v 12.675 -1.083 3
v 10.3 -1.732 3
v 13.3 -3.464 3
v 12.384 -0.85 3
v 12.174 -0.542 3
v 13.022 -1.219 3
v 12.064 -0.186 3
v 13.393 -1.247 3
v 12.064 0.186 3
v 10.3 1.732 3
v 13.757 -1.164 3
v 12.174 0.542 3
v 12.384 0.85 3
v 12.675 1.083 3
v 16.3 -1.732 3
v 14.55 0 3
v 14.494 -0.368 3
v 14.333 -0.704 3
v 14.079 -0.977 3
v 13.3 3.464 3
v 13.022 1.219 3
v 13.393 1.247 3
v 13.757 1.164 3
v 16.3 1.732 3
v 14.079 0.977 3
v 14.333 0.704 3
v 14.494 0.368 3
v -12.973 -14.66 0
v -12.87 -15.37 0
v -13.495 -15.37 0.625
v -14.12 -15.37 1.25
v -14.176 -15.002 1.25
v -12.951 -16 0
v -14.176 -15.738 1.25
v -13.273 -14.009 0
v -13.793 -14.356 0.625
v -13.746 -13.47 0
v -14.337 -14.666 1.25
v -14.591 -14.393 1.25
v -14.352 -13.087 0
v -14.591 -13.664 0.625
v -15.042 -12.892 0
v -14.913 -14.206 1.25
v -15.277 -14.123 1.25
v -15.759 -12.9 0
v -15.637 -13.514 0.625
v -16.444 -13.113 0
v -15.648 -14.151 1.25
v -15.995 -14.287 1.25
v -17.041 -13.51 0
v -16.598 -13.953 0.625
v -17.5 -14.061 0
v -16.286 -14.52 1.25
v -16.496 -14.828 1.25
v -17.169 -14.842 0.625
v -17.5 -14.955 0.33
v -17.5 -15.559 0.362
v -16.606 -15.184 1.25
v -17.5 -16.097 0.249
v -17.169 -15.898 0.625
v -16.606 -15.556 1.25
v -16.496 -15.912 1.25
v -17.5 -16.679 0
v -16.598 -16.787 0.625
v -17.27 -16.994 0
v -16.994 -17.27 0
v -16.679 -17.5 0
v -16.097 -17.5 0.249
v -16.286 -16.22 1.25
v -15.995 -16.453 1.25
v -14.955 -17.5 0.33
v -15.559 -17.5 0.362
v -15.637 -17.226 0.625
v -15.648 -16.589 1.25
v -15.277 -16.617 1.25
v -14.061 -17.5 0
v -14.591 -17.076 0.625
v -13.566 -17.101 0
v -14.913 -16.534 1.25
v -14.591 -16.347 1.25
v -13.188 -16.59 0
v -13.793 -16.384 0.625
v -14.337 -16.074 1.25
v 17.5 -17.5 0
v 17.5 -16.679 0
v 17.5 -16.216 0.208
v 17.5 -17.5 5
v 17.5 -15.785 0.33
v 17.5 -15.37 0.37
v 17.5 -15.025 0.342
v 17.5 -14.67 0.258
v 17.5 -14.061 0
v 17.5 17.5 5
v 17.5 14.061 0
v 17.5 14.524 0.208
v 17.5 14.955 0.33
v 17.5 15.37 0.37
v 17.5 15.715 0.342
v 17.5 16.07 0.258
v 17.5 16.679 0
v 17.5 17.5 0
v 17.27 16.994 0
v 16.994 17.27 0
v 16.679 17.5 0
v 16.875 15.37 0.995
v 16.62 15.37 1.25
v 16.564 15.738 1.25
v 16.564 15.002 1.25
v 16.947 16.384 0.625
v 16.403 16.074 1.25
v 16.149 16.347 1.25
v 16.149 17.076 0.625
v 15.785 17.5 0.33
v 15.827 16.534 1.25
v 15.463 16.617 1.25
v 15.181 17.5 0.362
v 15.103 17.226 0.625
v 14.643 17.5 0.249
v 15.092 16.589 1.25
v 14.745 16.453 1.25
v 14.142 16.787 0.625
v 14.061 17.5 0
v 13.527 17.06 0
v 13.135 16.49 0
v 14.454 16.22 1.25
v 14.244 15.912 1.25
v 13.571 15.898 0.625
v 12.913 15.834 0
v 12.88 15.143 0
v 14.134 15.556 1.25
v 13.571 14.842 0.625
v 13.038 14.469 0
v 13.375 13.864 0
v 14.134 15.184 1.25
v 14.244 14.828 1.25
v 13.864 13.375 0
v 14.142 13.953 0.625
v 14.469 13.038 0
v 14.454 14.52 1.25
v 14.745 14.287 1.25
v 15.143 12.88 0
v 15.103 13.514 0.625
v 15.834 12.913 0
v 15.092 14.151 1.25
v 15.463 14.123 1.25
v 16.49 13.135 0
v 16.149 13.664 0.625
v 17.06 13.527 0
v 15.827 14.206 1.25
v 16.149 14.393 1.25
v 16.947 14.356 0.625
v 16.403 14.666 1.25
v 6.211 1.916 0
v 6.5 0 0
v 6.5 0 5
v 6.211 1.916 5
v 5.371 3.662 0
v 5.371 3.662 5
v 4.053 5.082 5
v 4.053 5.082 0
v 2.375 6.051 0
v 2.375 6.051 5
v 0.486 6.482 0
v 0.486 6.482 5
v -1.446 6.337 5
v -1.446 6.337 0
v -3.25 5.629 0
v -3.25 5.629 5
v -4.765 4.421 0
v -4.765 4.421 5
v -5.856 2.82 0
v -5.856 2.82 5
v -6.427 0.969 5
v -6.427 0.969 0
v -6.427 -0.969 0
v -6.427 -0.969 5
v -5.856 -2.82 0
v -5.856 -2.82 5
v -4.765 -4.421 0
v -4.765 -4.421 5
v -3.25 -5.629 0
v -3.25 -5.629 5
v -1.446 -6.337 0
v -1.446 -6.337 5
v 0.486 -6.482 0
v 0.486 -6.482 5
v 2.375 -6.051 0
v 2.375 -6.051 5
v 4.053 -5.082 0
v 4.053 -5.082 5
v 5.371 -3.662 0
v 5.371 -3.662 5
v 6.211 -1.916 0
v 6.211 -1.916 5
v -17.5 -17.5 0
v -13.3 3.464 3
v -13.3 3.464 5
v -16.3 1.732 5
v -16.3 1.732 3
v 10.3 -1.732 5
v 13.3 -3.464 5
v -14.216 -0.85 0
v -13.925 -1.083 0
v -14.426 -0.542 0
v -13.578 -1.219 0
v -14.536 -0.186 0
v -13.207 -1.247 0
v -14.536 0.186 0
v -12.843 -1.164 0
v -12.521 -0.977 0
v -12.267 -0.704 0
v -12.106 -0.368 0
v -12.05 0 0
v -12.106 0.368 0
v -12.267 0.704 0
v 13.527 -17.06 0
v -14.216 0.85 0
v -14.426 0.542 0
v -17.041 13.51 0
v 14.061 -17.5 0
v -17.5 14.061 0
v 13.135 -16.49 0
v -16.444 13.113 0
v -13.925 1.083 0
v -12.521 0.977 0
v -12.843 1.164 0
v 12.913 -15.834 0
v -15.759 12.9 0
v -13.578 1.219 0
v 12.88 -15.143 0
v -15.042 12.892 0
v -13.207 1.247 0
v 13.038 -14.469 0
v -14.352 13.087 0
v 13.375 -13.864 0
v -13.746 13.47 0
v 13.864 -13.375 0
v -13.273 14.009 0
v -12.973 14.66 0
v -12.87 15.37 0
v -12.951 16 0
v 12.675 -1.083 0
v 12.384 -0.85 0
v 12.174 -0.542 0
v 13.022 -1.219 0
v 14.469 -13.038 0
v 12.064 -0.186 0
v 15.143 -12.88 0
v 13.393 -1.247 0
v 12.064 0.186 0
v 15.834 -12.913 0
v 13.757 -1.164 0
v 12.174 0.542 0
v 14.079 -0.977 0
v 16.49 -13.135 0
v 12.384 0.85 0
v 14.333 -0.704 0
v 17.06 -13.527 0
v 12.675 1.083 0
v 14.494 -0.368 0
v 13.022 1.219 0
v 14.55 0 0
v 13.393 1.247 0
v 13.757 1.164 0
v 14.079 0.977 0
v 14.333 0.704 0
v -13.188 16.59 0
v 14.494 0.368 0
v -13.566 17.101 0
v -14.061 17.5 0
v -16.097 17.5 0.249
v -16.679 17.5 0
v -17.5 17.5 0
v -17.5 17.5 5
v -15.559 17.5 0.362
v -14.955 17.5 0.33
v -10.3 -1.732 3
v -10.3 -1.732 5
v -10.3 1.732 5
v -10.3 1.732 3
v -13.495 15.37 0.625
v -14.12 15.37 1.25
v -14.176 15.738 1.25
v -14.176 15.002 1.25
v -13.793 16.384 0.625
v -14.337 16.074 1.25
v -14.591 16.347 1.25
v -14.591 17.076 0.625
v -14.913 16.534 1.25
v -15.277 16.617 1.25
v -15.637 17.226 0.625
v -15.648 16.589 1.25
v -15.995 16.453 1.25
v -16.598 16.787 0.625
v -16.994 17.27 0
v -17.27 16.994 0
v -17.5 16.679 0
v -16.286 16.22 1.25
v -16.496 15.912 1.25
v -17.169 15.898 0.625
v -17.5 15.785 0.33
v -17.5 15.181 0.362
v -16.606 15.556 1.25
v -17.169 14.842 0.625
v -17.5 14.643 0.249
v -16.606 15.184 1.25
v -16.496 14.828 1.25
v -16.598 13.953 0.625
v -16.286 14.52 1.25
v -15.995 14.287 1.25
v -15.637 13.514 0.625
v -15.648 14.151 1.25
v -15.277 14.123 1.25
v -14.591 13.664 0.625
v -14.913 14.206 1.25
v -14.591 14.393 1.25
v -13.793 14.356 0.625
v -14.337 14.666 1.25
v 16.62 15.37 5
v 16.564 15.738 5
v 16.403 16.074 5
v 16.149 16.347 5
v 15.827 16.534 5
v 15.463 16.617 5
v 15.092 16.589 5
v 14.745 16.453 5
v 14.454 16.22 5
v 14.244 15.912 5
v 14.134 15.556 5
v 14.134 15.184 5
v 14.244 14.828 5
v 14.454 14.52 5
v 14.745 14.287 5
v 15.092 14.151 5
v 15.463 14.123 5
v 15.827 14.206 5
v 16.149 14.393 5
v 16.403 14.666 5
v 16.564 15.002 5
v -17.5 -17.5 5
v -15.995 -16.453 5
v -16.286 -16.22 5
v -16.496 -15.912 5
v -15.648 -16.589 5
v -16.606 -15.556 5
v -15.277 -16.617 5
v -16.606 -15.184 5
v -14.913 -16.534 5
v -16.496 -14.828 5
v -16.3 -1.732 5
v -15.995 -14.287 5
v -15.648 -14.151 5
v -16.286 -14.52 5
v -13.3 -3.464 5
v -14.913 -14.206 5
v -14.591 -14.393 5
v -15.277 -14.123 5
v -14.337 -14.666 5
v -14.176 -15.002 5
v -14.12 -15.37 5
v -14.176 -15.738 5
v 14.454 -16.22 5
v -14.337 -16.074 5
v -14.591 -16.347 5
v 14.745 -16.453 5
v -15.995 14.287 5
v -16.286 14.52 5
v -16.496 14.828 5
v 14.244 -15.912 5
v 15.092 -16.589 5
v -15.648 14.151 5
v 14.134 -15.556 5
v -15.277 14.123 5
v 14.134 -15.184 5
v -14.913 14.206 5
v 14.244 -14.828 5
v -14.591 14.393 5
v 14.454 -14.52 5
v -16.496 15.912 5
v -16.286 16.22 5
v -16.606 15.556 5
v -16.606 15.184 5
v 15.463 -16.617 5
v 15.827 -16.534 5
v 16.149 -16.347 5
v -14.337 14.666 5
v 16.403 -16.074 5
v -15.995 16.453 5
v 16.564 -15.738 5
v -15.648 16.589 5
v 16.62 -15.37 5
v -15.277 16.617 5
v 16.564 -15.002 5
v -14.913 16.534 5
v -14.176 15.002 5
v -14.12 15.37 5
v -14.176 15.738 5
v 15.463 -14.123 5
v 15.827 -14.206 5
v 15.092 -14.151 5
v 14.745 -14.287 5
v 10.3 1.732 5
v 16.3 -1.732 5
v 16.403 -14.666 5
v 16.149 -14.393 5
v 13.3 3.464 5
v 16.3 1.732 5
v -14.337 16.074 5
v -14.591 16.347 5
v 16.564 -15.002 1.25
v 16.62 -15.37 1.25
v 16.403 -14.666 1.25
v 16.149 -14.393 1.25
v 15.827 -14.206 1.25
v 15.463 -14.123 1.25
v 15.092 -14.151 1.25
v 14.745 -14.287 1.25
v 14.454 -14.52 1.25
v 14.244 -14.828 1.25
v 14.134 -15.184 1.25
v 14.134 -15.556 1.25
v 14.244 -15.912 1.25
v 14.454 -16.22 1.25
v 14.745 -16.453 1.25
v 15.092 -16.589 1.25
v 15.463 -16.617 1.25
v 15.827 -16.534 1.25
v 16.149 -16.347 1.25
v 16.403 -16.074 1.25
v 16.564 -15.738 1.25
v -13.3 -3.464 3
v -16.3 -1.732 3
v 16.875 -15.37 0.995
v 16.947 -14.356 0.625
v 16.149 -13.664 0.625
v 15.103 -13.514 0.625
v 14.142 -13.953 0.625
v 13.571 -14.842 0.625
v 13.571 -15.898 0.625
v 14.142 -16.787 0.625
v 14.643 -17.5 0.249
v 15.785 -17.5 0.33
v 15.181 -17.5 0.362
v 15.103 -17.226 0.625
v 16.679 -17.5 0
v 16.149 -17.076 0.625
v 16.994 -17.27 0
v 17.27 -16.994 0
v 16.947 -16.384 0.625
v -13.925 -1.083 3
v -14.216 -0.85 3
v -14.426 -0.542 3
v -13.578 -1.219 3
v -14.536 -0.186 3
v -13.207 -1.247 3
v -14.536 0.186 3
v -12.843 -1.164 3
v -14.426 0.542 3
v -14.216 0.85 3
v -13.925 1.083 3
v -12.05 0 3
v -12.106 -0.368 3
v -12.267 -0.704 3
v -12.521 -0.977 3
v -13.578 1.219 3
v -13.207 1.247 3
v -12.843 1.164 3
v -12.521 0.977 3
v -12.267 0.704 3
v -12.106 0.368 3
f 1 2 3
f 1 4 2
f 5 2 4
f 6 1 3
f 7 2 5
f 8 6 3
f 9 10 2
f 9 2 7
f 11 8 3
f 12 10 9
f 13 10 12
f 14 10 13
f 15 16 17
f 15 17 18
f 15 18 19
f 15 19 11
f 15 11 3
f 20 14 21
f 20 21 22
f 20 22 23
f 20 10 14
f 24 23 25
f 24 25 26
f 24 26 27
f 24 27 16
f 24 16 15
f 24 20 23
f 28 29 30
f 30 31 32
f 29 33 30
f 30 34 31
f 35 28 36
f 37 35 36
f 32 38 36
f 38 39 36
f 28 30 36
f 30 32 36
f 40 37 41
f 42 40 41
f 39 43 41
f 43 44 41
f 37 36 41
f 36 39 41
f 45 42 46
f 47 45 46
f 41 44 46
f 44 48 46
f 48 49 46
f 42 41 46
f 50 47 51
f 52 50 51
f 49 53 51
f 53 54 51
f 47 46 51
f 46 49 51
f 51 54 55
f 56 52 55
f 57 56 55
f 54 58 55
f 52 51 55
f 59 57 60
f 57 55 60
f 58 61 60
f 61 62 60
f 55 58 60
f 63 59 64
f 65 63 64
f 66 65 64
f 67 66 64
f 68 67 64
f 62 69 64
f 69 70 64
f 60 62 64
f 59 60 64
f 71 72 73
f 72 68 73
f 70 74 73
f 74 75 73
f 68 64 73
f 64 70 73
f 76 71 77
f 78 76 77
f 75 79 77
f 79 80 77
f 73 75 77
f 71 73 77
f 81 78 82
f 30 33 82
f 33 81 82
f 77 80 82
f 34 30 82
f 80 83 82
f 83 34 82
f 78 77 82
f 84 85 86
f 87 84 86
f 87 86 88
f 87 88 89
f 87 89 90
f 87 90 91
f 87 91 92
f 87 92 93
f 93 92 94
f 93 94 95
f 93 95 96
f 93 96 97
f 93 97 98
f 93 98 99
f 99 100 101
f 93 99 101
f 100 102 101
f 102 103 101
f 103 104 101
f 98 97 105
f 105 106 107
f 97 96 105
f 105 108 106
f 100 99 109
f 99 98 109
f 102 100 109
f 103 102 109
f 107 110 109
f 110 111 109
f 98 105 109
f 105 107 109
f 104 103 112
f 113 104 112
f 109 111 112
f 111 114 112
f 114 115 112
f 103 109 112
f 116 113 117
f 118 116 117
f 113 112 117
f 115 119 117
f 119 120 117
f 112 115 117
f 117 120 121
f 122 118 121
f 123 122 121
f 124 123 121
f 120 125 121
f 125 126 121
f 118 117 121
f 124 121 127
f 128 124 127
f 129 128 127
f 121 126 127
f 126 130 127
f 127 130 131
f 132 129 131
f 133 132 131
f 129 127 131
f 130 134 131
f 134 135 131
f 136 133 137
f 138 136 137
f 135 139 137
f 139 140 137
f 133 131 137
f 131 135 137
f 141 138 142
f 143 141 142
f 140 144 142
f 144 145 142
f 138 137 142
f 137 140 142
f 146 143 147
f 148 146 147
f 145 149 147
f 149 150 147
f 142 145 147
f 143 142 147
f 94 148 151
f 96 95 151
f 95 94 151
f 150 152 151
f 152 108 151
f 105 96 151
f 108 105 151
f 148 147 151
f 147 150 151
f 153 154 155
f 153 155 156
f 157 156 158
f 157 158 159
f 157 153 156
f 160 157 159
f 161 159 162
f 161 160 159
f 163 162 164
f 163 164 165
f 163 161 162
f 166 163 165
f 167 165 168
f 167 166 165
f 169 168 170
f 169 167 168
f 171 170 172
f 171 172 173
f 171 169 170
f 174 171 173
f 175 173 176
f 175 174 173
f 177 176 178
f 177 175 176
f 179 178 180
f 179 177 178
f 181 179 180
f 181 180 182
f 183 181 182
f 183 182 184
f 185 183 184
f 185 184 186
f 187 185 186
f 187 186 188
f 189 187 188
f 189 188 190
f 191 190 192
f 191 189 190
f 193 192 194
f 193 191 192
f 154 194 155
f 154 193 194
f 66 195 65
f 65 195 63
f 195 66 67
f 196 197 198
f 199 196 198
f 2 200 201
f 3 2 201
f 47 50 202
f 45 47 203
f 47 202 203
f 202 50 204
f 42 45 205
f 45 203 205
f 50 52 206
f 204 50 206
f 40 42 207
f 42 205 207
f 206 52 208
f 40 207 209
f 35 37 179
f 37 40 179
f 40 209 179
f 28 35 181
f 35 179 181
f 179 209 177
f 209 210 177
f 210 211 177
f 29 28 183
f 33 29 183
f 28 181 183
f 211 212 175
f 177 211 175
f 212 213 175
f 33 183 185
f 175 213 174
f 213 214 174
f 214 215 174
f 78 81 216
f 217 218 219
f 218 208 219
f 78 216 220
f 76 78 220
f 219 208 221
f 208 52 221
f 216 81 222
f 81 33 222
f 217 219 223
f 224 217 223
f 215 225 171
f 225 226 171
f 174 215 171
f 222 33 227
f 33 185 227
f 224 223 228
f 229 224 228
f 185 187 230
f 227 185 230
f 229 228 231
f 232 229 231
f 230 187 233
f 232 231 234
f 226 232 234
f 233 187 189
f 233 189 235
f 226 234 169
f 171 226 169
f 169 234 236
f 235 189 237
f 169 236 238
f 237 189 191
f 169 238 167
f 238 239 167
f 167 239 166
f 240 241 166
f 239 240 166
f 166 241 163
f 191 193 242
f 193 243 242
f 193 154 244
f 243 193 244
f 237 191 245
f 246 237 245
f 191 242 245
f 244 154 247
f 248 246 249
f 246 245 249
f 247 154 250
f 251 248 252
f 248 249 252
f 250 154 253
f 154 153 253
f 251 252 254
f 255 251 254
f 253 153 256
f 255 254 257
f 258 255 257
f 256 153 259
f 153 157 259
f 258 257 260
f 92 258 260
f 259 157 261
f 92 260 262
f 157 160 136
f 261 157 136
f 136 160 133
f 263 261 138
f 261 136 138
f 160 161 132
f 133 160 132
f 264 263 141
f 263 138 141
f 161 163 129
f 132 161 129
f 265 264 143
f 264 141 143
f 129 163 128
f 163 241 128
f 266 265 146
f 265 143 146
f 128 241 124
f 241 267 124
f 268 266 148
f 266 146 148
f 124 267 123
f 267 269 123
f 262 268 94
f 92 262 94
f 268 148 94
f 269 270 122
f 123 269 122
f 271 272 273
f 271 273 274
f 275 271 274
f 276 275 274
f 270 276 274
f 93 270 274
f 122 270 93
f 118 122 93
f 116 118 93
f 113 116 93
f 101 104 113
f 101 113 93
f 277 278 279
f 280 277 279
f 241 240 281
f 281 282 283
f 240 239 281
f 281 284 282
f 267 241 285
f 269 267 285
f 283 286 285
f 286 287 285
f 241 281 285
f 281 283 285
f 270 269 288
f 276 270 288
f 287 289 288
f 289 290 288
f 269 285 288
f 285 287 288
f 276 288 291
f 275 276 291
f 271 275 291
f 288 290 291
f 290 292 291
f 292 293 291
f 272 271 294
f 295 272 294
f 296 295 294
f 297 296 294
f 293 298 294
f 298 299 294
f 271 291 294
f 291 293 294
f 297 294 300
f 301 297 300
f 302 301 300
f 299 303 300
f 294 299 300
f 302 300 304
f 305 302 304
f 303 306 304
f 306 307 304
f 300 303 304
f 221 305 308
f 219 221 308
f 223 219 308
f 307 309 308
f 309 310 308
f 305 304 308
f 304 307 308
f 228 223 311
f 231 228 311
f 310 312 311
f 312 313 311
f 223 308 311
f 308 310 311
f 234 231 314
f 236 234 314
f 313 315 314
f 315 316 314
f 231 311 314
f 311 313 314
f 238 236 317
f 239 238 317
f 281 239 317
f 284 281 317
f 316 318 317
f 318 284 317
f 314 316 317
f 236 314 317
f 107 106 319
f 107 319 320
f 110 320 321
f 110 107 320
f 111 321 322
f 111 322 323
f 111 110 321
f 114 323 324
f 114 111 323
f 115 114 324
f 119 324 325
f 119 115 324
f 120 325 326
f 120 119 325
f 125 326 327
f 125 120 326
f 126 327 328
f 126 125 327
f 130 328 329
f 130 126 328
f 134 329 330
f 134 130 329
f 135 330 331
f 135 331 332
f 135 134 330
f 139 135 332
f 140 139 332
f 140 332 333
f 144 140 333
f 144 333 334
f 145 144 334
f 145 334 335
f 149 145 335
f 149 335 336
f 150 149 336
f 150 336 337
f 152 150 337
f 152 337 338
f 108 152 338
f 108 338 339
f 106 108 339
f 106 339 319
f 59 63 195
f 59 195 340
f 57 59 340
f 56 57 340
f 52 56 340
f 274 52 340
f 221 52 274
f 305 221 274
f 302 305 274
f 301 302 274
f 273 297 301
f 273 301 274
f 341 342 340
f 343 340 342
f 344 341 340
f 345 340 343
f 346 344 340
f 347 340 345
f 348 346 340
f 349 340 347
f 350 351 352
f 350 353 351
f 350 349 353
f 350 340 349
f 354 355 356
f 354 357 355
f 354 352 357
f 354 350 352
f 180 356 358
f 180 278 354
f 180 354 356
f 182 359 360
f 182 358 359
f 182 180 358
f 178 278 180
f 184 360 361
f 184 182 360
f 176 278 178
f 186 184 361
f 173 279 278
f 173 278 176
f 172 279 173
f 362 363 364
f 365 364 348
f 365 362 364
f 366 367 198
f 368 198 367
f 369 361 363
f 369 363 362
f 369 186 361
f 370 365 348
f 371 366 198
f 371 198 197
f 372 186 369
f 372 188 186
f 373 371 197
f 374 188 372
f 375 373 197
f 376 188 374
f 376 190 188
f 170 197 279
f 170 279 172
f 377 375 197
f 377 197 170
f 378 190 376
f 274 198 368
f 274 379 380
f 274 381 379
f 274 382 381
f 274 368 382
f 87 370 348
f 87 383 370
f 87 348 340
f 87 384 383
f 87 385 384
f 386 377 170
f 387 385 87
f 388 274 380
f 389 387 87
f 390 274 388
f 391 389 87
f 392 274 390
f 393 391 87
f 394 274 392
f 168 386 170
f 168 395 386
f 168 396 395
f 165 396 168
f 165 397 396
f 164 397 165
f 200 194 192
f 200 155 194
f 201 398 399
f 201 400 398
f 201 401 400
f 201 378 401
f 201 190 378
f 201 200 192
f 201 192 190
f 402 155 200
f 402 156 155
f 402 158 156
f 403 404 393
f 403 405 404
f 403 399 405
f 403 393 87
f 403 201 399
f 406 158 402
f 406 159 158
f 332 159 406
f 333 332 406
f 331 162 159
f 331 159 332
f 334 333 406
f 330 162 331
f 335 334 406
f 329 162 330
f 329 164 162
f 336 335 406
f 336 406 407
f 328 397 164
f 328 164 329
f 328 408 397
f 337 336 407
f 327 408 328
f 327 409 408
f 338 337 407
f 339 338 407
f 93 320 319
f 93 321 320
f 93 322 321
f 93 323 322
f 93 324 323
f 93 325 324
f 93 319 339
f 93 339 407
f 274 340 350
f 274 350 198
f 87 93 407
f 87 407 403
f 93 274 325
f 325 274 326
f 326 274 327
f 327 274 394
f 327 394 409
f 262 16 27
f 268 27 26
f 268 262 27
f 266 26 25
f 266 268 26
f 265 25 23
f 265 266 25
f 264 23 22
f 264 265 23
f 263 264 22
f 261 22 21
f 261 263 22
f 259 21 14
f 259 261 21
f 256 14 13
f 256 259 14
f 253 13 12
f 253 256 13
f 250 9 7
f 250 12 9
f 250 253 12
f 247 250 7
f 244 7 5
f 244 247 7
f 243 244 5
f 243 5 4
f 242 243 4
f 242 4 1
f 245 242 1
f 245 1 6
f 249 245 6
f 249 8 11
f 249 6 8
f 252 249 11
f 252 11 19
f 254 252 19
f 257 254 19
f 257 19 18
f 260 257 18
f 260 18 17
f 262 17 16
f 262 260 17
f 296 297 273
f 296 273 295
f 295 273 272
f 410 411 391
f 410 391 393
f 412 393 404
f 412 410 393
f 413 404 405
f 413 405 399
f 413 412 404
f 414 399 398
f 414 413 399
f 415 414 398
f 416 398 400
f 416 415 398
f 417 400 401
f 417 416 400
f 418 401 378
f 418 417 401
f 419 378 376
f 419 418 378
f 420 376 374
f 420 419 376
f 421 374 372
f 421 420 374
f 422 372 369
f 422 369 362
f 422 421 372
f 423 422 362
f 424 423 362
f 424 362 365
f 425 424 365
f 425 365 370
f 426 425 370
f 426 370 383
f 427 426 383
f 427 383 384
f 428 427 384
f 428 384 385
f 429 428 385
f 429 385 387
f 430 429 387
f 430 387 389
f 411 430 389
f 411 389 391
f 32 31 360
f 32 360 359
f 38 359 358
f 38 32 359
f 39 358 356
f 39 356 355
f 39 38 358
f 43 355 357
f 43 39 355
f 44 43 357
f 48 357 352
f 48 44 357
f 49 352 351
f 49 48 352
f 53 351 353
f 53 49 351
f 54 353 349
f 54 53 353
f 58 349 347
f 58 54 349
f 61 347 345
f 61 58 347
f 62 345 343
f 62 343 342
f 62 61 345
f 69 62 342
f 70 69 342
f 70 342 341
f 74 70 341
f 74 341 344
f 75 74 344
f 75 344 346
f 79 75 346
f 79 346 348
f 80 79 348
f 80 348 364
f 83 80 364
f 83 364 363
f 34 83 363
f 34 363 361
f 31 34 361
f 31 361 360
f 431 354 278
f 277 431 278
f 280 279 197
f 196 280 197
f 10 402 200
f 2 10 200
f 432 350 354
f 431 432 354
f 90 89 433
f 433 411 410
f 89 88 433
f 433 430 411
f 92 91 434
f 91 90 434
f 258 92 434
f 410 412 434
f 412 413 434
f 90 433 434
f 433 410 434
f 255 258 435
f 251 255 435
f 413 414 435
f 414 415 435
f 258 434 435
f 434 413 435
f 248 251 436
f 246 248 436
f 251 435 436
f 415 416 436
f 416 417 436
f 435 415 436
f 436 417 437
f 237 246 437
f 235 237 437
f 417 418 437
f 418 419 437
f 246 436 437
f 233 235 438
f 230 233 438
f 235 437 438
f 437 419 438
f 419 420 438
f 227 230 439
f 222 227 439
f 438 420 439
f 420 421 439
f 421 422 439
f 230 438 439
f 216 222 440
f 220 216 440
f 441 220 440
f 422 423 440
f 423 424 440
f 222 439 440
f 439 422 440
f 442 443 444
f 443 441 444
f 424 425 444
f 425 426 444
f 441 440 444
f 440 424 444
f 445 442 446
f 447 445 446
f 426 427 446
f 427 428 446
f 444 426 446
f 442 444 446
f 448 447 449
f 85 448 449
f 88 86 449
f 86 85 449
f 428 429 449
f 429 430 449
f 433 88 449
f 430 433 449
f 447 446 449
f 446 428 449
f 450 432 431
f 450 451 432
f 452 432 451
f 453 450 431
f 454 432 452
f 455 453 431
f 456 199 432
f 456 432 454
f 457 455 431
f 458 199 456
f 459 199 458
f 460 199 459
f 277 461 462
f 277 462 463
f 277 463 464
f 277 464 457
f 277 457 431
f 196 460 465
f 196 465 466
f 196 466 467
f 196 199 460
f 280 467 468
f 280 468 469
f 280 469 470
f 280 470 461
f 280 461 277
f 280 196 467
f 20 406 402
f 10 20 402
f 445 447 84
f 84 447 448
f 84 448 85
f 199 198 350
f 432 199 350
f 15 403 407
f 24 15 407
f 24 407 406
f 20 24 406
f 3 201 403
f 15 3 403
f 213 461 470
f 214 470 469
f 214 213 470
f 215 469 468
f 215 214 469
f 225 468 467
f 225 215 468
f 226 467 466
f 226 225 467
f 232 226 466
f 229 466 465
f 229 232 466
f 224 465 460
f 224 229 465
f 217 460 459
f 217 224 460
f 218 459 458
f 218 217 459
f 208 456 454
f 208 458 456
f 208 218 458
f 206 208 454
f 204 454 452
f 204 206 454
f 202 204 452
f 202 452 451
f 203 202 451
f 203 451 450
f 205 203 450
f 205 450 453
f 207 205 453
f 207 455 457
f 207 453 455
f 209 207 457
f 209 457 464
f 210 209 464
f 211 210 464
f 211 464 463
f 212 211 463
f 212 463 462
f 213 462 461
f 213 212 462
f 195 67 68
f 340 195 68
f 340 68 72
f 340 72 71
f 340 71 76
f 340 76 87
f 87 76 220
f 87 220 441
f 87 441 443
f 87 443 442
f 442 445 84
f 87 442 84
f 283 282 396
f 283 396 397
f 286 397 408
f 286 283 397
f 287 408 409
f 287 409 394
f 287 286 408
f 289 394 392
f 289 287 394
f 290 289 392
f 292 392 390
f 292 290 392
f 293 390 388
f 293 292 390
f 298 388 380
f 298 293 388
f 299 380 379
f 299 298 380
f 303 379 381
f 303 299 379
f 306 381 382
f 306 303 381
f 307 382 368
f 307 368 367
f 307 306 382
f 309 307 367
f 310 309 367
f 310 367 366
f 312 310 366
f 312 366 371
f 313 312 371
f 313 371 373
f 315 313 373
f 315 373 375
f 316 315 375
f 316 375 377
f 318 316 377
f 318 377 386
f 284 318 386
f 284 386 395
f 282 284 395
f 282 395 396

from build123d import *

# Parameters (mm, degrees)
CROQUIS1_W              = 35
CROQUIS1_H              = 35
CROQUIS1_R              = 1.25
CROQUIS1_R_2            = 6.5
SALIENTE_EXTRUIR1_DEPTH = 5
CORTAR_EXTRUIR1_DEPTH   = 2
CHAFL_N1_SIZE           = 1.25


with BuildPart() as part:
    # Croquis1 → Saliente-Extruir1 (new body)
    with BuildSketch(Plane.XY):
        Rectangle(CROQUIS1_W, CROQUIS1_H)
        with Locations((-15.37, 15.37)):
            Circle(CROQUIS1_R, mode=Mode.SUBTRACT)
        with Locations((15.37, 15.37)):
            Circle(CROQUIS1_R, mode=Mode.SUBTRACT)
        with Locations((15.37, -15.37)):
            Circle(CROQUIS1_R, mode=Mode.SUBTRACT)
        with Locations((-15.37, -15.37)):
            Circle(CROQUIS1_R, mode=Mode.SUBTRACT)
        Circle(CROQUIS1_R_2, mode=Mode.SUBTRACT)
        with Locations((13.3, 0)):
            Circle(CROQUIS1_R, mode=Mode.SUBTRACT)
        with Locations((-13.3, 0)):
            Circle(CROQUIS1_R, mode=Mode.SUBTRACT)
    extrude(amount=SALIENTE_EXTRUIR1_DEPTH)

    # Croquis2 → Cortar-Extruir1 (cut)
    with BuildSketch(Plane.XY.offset(5)):
        Polygon((-13.3, 3.464101615), (-16.3, 1.732050808), (-16.3, -1.732050808), (-13.3, -3.464101615), (-10.3, -1.732050808), (-10.3, 1.732050808), align=None)
        Polygon((13.3, 3.464101615), (10.3, 1.732050808), (10.3, -1.732050808), (13.3, -3.464101615), (16.3, -1.732050808), (16.3, 1.732050808), align=None)
    extrude(amount=-CORTAR_EXTRUIR1_DEPTH, mode=Mode.SUBTRACT)

    # Chaflán1
    # the kernel refuses this chamfer: 1.25 mm, written as the material it takes off along each edge
    with BuildSketch(Plane(origin=(-15.37, 15.37, 0), x_dir=(1, 0, 0), z_dir=(0, -1, 0))) as chafl_n1_piece_1:
        Polygon((1.25 + CHAFL_N1_SIZE, 0), (1.25, CHAFL_N1_SIZE), (1.25, 0), align=None)
    revolve(axis=Axis((-15.37, 15.37, 0), (0, 0, 1)), mode=Mode.SUBTRACT)
    with BuildSketch(Plane(origin=(15.37, 15.37, 0), x_dir=(1, 0, 0), z_dir=(0, -1, 0))) as chafl_n1_piece_2:
        Polygon((1.25 + CHAFL_N1_SIZE, 0), (1.25, CHAFL_N1_SIZE), (1.25, 0), align=None)
    revolve(axis=Axis((15.37, 15.37, 0), (0, 0, 1)), mode=Mode.SUBTRACT)
    with BuildSketch(Plane(origin=(15.37, -15.37, 0), x_dir=(1, 0, 0), z_dir=(0, -1, 0))) as chafl_n1_piece_3:
        Polygon((1.25 + CHAFL_N1_SIZE, 0), (1.25, CHAFL_N1_SIZE), (1.25, 0), align=None)
    revolve(axis=Axis((15.37, -15.37, 0), (0, 0, 1)), mode=Mode.SUBTRACT)
    with BuildSketch(Plane(origin=(-15.37, -15.37, 0), x_dir=(1, 0, 0), z_dir=(0, -1, 0))) as chafl_n1_piece_4:
        Polygon((1.25 + CHAFL_N1_SIZE, 0), (1.25, CHAFL_N1_SIZE), (1.25, 0), align=None)
    revolve(axis=Axis((-15.37, -15.37, 0), (0, 0, 1)), mode=Mode.SUBTRACT)


solid = part.part
